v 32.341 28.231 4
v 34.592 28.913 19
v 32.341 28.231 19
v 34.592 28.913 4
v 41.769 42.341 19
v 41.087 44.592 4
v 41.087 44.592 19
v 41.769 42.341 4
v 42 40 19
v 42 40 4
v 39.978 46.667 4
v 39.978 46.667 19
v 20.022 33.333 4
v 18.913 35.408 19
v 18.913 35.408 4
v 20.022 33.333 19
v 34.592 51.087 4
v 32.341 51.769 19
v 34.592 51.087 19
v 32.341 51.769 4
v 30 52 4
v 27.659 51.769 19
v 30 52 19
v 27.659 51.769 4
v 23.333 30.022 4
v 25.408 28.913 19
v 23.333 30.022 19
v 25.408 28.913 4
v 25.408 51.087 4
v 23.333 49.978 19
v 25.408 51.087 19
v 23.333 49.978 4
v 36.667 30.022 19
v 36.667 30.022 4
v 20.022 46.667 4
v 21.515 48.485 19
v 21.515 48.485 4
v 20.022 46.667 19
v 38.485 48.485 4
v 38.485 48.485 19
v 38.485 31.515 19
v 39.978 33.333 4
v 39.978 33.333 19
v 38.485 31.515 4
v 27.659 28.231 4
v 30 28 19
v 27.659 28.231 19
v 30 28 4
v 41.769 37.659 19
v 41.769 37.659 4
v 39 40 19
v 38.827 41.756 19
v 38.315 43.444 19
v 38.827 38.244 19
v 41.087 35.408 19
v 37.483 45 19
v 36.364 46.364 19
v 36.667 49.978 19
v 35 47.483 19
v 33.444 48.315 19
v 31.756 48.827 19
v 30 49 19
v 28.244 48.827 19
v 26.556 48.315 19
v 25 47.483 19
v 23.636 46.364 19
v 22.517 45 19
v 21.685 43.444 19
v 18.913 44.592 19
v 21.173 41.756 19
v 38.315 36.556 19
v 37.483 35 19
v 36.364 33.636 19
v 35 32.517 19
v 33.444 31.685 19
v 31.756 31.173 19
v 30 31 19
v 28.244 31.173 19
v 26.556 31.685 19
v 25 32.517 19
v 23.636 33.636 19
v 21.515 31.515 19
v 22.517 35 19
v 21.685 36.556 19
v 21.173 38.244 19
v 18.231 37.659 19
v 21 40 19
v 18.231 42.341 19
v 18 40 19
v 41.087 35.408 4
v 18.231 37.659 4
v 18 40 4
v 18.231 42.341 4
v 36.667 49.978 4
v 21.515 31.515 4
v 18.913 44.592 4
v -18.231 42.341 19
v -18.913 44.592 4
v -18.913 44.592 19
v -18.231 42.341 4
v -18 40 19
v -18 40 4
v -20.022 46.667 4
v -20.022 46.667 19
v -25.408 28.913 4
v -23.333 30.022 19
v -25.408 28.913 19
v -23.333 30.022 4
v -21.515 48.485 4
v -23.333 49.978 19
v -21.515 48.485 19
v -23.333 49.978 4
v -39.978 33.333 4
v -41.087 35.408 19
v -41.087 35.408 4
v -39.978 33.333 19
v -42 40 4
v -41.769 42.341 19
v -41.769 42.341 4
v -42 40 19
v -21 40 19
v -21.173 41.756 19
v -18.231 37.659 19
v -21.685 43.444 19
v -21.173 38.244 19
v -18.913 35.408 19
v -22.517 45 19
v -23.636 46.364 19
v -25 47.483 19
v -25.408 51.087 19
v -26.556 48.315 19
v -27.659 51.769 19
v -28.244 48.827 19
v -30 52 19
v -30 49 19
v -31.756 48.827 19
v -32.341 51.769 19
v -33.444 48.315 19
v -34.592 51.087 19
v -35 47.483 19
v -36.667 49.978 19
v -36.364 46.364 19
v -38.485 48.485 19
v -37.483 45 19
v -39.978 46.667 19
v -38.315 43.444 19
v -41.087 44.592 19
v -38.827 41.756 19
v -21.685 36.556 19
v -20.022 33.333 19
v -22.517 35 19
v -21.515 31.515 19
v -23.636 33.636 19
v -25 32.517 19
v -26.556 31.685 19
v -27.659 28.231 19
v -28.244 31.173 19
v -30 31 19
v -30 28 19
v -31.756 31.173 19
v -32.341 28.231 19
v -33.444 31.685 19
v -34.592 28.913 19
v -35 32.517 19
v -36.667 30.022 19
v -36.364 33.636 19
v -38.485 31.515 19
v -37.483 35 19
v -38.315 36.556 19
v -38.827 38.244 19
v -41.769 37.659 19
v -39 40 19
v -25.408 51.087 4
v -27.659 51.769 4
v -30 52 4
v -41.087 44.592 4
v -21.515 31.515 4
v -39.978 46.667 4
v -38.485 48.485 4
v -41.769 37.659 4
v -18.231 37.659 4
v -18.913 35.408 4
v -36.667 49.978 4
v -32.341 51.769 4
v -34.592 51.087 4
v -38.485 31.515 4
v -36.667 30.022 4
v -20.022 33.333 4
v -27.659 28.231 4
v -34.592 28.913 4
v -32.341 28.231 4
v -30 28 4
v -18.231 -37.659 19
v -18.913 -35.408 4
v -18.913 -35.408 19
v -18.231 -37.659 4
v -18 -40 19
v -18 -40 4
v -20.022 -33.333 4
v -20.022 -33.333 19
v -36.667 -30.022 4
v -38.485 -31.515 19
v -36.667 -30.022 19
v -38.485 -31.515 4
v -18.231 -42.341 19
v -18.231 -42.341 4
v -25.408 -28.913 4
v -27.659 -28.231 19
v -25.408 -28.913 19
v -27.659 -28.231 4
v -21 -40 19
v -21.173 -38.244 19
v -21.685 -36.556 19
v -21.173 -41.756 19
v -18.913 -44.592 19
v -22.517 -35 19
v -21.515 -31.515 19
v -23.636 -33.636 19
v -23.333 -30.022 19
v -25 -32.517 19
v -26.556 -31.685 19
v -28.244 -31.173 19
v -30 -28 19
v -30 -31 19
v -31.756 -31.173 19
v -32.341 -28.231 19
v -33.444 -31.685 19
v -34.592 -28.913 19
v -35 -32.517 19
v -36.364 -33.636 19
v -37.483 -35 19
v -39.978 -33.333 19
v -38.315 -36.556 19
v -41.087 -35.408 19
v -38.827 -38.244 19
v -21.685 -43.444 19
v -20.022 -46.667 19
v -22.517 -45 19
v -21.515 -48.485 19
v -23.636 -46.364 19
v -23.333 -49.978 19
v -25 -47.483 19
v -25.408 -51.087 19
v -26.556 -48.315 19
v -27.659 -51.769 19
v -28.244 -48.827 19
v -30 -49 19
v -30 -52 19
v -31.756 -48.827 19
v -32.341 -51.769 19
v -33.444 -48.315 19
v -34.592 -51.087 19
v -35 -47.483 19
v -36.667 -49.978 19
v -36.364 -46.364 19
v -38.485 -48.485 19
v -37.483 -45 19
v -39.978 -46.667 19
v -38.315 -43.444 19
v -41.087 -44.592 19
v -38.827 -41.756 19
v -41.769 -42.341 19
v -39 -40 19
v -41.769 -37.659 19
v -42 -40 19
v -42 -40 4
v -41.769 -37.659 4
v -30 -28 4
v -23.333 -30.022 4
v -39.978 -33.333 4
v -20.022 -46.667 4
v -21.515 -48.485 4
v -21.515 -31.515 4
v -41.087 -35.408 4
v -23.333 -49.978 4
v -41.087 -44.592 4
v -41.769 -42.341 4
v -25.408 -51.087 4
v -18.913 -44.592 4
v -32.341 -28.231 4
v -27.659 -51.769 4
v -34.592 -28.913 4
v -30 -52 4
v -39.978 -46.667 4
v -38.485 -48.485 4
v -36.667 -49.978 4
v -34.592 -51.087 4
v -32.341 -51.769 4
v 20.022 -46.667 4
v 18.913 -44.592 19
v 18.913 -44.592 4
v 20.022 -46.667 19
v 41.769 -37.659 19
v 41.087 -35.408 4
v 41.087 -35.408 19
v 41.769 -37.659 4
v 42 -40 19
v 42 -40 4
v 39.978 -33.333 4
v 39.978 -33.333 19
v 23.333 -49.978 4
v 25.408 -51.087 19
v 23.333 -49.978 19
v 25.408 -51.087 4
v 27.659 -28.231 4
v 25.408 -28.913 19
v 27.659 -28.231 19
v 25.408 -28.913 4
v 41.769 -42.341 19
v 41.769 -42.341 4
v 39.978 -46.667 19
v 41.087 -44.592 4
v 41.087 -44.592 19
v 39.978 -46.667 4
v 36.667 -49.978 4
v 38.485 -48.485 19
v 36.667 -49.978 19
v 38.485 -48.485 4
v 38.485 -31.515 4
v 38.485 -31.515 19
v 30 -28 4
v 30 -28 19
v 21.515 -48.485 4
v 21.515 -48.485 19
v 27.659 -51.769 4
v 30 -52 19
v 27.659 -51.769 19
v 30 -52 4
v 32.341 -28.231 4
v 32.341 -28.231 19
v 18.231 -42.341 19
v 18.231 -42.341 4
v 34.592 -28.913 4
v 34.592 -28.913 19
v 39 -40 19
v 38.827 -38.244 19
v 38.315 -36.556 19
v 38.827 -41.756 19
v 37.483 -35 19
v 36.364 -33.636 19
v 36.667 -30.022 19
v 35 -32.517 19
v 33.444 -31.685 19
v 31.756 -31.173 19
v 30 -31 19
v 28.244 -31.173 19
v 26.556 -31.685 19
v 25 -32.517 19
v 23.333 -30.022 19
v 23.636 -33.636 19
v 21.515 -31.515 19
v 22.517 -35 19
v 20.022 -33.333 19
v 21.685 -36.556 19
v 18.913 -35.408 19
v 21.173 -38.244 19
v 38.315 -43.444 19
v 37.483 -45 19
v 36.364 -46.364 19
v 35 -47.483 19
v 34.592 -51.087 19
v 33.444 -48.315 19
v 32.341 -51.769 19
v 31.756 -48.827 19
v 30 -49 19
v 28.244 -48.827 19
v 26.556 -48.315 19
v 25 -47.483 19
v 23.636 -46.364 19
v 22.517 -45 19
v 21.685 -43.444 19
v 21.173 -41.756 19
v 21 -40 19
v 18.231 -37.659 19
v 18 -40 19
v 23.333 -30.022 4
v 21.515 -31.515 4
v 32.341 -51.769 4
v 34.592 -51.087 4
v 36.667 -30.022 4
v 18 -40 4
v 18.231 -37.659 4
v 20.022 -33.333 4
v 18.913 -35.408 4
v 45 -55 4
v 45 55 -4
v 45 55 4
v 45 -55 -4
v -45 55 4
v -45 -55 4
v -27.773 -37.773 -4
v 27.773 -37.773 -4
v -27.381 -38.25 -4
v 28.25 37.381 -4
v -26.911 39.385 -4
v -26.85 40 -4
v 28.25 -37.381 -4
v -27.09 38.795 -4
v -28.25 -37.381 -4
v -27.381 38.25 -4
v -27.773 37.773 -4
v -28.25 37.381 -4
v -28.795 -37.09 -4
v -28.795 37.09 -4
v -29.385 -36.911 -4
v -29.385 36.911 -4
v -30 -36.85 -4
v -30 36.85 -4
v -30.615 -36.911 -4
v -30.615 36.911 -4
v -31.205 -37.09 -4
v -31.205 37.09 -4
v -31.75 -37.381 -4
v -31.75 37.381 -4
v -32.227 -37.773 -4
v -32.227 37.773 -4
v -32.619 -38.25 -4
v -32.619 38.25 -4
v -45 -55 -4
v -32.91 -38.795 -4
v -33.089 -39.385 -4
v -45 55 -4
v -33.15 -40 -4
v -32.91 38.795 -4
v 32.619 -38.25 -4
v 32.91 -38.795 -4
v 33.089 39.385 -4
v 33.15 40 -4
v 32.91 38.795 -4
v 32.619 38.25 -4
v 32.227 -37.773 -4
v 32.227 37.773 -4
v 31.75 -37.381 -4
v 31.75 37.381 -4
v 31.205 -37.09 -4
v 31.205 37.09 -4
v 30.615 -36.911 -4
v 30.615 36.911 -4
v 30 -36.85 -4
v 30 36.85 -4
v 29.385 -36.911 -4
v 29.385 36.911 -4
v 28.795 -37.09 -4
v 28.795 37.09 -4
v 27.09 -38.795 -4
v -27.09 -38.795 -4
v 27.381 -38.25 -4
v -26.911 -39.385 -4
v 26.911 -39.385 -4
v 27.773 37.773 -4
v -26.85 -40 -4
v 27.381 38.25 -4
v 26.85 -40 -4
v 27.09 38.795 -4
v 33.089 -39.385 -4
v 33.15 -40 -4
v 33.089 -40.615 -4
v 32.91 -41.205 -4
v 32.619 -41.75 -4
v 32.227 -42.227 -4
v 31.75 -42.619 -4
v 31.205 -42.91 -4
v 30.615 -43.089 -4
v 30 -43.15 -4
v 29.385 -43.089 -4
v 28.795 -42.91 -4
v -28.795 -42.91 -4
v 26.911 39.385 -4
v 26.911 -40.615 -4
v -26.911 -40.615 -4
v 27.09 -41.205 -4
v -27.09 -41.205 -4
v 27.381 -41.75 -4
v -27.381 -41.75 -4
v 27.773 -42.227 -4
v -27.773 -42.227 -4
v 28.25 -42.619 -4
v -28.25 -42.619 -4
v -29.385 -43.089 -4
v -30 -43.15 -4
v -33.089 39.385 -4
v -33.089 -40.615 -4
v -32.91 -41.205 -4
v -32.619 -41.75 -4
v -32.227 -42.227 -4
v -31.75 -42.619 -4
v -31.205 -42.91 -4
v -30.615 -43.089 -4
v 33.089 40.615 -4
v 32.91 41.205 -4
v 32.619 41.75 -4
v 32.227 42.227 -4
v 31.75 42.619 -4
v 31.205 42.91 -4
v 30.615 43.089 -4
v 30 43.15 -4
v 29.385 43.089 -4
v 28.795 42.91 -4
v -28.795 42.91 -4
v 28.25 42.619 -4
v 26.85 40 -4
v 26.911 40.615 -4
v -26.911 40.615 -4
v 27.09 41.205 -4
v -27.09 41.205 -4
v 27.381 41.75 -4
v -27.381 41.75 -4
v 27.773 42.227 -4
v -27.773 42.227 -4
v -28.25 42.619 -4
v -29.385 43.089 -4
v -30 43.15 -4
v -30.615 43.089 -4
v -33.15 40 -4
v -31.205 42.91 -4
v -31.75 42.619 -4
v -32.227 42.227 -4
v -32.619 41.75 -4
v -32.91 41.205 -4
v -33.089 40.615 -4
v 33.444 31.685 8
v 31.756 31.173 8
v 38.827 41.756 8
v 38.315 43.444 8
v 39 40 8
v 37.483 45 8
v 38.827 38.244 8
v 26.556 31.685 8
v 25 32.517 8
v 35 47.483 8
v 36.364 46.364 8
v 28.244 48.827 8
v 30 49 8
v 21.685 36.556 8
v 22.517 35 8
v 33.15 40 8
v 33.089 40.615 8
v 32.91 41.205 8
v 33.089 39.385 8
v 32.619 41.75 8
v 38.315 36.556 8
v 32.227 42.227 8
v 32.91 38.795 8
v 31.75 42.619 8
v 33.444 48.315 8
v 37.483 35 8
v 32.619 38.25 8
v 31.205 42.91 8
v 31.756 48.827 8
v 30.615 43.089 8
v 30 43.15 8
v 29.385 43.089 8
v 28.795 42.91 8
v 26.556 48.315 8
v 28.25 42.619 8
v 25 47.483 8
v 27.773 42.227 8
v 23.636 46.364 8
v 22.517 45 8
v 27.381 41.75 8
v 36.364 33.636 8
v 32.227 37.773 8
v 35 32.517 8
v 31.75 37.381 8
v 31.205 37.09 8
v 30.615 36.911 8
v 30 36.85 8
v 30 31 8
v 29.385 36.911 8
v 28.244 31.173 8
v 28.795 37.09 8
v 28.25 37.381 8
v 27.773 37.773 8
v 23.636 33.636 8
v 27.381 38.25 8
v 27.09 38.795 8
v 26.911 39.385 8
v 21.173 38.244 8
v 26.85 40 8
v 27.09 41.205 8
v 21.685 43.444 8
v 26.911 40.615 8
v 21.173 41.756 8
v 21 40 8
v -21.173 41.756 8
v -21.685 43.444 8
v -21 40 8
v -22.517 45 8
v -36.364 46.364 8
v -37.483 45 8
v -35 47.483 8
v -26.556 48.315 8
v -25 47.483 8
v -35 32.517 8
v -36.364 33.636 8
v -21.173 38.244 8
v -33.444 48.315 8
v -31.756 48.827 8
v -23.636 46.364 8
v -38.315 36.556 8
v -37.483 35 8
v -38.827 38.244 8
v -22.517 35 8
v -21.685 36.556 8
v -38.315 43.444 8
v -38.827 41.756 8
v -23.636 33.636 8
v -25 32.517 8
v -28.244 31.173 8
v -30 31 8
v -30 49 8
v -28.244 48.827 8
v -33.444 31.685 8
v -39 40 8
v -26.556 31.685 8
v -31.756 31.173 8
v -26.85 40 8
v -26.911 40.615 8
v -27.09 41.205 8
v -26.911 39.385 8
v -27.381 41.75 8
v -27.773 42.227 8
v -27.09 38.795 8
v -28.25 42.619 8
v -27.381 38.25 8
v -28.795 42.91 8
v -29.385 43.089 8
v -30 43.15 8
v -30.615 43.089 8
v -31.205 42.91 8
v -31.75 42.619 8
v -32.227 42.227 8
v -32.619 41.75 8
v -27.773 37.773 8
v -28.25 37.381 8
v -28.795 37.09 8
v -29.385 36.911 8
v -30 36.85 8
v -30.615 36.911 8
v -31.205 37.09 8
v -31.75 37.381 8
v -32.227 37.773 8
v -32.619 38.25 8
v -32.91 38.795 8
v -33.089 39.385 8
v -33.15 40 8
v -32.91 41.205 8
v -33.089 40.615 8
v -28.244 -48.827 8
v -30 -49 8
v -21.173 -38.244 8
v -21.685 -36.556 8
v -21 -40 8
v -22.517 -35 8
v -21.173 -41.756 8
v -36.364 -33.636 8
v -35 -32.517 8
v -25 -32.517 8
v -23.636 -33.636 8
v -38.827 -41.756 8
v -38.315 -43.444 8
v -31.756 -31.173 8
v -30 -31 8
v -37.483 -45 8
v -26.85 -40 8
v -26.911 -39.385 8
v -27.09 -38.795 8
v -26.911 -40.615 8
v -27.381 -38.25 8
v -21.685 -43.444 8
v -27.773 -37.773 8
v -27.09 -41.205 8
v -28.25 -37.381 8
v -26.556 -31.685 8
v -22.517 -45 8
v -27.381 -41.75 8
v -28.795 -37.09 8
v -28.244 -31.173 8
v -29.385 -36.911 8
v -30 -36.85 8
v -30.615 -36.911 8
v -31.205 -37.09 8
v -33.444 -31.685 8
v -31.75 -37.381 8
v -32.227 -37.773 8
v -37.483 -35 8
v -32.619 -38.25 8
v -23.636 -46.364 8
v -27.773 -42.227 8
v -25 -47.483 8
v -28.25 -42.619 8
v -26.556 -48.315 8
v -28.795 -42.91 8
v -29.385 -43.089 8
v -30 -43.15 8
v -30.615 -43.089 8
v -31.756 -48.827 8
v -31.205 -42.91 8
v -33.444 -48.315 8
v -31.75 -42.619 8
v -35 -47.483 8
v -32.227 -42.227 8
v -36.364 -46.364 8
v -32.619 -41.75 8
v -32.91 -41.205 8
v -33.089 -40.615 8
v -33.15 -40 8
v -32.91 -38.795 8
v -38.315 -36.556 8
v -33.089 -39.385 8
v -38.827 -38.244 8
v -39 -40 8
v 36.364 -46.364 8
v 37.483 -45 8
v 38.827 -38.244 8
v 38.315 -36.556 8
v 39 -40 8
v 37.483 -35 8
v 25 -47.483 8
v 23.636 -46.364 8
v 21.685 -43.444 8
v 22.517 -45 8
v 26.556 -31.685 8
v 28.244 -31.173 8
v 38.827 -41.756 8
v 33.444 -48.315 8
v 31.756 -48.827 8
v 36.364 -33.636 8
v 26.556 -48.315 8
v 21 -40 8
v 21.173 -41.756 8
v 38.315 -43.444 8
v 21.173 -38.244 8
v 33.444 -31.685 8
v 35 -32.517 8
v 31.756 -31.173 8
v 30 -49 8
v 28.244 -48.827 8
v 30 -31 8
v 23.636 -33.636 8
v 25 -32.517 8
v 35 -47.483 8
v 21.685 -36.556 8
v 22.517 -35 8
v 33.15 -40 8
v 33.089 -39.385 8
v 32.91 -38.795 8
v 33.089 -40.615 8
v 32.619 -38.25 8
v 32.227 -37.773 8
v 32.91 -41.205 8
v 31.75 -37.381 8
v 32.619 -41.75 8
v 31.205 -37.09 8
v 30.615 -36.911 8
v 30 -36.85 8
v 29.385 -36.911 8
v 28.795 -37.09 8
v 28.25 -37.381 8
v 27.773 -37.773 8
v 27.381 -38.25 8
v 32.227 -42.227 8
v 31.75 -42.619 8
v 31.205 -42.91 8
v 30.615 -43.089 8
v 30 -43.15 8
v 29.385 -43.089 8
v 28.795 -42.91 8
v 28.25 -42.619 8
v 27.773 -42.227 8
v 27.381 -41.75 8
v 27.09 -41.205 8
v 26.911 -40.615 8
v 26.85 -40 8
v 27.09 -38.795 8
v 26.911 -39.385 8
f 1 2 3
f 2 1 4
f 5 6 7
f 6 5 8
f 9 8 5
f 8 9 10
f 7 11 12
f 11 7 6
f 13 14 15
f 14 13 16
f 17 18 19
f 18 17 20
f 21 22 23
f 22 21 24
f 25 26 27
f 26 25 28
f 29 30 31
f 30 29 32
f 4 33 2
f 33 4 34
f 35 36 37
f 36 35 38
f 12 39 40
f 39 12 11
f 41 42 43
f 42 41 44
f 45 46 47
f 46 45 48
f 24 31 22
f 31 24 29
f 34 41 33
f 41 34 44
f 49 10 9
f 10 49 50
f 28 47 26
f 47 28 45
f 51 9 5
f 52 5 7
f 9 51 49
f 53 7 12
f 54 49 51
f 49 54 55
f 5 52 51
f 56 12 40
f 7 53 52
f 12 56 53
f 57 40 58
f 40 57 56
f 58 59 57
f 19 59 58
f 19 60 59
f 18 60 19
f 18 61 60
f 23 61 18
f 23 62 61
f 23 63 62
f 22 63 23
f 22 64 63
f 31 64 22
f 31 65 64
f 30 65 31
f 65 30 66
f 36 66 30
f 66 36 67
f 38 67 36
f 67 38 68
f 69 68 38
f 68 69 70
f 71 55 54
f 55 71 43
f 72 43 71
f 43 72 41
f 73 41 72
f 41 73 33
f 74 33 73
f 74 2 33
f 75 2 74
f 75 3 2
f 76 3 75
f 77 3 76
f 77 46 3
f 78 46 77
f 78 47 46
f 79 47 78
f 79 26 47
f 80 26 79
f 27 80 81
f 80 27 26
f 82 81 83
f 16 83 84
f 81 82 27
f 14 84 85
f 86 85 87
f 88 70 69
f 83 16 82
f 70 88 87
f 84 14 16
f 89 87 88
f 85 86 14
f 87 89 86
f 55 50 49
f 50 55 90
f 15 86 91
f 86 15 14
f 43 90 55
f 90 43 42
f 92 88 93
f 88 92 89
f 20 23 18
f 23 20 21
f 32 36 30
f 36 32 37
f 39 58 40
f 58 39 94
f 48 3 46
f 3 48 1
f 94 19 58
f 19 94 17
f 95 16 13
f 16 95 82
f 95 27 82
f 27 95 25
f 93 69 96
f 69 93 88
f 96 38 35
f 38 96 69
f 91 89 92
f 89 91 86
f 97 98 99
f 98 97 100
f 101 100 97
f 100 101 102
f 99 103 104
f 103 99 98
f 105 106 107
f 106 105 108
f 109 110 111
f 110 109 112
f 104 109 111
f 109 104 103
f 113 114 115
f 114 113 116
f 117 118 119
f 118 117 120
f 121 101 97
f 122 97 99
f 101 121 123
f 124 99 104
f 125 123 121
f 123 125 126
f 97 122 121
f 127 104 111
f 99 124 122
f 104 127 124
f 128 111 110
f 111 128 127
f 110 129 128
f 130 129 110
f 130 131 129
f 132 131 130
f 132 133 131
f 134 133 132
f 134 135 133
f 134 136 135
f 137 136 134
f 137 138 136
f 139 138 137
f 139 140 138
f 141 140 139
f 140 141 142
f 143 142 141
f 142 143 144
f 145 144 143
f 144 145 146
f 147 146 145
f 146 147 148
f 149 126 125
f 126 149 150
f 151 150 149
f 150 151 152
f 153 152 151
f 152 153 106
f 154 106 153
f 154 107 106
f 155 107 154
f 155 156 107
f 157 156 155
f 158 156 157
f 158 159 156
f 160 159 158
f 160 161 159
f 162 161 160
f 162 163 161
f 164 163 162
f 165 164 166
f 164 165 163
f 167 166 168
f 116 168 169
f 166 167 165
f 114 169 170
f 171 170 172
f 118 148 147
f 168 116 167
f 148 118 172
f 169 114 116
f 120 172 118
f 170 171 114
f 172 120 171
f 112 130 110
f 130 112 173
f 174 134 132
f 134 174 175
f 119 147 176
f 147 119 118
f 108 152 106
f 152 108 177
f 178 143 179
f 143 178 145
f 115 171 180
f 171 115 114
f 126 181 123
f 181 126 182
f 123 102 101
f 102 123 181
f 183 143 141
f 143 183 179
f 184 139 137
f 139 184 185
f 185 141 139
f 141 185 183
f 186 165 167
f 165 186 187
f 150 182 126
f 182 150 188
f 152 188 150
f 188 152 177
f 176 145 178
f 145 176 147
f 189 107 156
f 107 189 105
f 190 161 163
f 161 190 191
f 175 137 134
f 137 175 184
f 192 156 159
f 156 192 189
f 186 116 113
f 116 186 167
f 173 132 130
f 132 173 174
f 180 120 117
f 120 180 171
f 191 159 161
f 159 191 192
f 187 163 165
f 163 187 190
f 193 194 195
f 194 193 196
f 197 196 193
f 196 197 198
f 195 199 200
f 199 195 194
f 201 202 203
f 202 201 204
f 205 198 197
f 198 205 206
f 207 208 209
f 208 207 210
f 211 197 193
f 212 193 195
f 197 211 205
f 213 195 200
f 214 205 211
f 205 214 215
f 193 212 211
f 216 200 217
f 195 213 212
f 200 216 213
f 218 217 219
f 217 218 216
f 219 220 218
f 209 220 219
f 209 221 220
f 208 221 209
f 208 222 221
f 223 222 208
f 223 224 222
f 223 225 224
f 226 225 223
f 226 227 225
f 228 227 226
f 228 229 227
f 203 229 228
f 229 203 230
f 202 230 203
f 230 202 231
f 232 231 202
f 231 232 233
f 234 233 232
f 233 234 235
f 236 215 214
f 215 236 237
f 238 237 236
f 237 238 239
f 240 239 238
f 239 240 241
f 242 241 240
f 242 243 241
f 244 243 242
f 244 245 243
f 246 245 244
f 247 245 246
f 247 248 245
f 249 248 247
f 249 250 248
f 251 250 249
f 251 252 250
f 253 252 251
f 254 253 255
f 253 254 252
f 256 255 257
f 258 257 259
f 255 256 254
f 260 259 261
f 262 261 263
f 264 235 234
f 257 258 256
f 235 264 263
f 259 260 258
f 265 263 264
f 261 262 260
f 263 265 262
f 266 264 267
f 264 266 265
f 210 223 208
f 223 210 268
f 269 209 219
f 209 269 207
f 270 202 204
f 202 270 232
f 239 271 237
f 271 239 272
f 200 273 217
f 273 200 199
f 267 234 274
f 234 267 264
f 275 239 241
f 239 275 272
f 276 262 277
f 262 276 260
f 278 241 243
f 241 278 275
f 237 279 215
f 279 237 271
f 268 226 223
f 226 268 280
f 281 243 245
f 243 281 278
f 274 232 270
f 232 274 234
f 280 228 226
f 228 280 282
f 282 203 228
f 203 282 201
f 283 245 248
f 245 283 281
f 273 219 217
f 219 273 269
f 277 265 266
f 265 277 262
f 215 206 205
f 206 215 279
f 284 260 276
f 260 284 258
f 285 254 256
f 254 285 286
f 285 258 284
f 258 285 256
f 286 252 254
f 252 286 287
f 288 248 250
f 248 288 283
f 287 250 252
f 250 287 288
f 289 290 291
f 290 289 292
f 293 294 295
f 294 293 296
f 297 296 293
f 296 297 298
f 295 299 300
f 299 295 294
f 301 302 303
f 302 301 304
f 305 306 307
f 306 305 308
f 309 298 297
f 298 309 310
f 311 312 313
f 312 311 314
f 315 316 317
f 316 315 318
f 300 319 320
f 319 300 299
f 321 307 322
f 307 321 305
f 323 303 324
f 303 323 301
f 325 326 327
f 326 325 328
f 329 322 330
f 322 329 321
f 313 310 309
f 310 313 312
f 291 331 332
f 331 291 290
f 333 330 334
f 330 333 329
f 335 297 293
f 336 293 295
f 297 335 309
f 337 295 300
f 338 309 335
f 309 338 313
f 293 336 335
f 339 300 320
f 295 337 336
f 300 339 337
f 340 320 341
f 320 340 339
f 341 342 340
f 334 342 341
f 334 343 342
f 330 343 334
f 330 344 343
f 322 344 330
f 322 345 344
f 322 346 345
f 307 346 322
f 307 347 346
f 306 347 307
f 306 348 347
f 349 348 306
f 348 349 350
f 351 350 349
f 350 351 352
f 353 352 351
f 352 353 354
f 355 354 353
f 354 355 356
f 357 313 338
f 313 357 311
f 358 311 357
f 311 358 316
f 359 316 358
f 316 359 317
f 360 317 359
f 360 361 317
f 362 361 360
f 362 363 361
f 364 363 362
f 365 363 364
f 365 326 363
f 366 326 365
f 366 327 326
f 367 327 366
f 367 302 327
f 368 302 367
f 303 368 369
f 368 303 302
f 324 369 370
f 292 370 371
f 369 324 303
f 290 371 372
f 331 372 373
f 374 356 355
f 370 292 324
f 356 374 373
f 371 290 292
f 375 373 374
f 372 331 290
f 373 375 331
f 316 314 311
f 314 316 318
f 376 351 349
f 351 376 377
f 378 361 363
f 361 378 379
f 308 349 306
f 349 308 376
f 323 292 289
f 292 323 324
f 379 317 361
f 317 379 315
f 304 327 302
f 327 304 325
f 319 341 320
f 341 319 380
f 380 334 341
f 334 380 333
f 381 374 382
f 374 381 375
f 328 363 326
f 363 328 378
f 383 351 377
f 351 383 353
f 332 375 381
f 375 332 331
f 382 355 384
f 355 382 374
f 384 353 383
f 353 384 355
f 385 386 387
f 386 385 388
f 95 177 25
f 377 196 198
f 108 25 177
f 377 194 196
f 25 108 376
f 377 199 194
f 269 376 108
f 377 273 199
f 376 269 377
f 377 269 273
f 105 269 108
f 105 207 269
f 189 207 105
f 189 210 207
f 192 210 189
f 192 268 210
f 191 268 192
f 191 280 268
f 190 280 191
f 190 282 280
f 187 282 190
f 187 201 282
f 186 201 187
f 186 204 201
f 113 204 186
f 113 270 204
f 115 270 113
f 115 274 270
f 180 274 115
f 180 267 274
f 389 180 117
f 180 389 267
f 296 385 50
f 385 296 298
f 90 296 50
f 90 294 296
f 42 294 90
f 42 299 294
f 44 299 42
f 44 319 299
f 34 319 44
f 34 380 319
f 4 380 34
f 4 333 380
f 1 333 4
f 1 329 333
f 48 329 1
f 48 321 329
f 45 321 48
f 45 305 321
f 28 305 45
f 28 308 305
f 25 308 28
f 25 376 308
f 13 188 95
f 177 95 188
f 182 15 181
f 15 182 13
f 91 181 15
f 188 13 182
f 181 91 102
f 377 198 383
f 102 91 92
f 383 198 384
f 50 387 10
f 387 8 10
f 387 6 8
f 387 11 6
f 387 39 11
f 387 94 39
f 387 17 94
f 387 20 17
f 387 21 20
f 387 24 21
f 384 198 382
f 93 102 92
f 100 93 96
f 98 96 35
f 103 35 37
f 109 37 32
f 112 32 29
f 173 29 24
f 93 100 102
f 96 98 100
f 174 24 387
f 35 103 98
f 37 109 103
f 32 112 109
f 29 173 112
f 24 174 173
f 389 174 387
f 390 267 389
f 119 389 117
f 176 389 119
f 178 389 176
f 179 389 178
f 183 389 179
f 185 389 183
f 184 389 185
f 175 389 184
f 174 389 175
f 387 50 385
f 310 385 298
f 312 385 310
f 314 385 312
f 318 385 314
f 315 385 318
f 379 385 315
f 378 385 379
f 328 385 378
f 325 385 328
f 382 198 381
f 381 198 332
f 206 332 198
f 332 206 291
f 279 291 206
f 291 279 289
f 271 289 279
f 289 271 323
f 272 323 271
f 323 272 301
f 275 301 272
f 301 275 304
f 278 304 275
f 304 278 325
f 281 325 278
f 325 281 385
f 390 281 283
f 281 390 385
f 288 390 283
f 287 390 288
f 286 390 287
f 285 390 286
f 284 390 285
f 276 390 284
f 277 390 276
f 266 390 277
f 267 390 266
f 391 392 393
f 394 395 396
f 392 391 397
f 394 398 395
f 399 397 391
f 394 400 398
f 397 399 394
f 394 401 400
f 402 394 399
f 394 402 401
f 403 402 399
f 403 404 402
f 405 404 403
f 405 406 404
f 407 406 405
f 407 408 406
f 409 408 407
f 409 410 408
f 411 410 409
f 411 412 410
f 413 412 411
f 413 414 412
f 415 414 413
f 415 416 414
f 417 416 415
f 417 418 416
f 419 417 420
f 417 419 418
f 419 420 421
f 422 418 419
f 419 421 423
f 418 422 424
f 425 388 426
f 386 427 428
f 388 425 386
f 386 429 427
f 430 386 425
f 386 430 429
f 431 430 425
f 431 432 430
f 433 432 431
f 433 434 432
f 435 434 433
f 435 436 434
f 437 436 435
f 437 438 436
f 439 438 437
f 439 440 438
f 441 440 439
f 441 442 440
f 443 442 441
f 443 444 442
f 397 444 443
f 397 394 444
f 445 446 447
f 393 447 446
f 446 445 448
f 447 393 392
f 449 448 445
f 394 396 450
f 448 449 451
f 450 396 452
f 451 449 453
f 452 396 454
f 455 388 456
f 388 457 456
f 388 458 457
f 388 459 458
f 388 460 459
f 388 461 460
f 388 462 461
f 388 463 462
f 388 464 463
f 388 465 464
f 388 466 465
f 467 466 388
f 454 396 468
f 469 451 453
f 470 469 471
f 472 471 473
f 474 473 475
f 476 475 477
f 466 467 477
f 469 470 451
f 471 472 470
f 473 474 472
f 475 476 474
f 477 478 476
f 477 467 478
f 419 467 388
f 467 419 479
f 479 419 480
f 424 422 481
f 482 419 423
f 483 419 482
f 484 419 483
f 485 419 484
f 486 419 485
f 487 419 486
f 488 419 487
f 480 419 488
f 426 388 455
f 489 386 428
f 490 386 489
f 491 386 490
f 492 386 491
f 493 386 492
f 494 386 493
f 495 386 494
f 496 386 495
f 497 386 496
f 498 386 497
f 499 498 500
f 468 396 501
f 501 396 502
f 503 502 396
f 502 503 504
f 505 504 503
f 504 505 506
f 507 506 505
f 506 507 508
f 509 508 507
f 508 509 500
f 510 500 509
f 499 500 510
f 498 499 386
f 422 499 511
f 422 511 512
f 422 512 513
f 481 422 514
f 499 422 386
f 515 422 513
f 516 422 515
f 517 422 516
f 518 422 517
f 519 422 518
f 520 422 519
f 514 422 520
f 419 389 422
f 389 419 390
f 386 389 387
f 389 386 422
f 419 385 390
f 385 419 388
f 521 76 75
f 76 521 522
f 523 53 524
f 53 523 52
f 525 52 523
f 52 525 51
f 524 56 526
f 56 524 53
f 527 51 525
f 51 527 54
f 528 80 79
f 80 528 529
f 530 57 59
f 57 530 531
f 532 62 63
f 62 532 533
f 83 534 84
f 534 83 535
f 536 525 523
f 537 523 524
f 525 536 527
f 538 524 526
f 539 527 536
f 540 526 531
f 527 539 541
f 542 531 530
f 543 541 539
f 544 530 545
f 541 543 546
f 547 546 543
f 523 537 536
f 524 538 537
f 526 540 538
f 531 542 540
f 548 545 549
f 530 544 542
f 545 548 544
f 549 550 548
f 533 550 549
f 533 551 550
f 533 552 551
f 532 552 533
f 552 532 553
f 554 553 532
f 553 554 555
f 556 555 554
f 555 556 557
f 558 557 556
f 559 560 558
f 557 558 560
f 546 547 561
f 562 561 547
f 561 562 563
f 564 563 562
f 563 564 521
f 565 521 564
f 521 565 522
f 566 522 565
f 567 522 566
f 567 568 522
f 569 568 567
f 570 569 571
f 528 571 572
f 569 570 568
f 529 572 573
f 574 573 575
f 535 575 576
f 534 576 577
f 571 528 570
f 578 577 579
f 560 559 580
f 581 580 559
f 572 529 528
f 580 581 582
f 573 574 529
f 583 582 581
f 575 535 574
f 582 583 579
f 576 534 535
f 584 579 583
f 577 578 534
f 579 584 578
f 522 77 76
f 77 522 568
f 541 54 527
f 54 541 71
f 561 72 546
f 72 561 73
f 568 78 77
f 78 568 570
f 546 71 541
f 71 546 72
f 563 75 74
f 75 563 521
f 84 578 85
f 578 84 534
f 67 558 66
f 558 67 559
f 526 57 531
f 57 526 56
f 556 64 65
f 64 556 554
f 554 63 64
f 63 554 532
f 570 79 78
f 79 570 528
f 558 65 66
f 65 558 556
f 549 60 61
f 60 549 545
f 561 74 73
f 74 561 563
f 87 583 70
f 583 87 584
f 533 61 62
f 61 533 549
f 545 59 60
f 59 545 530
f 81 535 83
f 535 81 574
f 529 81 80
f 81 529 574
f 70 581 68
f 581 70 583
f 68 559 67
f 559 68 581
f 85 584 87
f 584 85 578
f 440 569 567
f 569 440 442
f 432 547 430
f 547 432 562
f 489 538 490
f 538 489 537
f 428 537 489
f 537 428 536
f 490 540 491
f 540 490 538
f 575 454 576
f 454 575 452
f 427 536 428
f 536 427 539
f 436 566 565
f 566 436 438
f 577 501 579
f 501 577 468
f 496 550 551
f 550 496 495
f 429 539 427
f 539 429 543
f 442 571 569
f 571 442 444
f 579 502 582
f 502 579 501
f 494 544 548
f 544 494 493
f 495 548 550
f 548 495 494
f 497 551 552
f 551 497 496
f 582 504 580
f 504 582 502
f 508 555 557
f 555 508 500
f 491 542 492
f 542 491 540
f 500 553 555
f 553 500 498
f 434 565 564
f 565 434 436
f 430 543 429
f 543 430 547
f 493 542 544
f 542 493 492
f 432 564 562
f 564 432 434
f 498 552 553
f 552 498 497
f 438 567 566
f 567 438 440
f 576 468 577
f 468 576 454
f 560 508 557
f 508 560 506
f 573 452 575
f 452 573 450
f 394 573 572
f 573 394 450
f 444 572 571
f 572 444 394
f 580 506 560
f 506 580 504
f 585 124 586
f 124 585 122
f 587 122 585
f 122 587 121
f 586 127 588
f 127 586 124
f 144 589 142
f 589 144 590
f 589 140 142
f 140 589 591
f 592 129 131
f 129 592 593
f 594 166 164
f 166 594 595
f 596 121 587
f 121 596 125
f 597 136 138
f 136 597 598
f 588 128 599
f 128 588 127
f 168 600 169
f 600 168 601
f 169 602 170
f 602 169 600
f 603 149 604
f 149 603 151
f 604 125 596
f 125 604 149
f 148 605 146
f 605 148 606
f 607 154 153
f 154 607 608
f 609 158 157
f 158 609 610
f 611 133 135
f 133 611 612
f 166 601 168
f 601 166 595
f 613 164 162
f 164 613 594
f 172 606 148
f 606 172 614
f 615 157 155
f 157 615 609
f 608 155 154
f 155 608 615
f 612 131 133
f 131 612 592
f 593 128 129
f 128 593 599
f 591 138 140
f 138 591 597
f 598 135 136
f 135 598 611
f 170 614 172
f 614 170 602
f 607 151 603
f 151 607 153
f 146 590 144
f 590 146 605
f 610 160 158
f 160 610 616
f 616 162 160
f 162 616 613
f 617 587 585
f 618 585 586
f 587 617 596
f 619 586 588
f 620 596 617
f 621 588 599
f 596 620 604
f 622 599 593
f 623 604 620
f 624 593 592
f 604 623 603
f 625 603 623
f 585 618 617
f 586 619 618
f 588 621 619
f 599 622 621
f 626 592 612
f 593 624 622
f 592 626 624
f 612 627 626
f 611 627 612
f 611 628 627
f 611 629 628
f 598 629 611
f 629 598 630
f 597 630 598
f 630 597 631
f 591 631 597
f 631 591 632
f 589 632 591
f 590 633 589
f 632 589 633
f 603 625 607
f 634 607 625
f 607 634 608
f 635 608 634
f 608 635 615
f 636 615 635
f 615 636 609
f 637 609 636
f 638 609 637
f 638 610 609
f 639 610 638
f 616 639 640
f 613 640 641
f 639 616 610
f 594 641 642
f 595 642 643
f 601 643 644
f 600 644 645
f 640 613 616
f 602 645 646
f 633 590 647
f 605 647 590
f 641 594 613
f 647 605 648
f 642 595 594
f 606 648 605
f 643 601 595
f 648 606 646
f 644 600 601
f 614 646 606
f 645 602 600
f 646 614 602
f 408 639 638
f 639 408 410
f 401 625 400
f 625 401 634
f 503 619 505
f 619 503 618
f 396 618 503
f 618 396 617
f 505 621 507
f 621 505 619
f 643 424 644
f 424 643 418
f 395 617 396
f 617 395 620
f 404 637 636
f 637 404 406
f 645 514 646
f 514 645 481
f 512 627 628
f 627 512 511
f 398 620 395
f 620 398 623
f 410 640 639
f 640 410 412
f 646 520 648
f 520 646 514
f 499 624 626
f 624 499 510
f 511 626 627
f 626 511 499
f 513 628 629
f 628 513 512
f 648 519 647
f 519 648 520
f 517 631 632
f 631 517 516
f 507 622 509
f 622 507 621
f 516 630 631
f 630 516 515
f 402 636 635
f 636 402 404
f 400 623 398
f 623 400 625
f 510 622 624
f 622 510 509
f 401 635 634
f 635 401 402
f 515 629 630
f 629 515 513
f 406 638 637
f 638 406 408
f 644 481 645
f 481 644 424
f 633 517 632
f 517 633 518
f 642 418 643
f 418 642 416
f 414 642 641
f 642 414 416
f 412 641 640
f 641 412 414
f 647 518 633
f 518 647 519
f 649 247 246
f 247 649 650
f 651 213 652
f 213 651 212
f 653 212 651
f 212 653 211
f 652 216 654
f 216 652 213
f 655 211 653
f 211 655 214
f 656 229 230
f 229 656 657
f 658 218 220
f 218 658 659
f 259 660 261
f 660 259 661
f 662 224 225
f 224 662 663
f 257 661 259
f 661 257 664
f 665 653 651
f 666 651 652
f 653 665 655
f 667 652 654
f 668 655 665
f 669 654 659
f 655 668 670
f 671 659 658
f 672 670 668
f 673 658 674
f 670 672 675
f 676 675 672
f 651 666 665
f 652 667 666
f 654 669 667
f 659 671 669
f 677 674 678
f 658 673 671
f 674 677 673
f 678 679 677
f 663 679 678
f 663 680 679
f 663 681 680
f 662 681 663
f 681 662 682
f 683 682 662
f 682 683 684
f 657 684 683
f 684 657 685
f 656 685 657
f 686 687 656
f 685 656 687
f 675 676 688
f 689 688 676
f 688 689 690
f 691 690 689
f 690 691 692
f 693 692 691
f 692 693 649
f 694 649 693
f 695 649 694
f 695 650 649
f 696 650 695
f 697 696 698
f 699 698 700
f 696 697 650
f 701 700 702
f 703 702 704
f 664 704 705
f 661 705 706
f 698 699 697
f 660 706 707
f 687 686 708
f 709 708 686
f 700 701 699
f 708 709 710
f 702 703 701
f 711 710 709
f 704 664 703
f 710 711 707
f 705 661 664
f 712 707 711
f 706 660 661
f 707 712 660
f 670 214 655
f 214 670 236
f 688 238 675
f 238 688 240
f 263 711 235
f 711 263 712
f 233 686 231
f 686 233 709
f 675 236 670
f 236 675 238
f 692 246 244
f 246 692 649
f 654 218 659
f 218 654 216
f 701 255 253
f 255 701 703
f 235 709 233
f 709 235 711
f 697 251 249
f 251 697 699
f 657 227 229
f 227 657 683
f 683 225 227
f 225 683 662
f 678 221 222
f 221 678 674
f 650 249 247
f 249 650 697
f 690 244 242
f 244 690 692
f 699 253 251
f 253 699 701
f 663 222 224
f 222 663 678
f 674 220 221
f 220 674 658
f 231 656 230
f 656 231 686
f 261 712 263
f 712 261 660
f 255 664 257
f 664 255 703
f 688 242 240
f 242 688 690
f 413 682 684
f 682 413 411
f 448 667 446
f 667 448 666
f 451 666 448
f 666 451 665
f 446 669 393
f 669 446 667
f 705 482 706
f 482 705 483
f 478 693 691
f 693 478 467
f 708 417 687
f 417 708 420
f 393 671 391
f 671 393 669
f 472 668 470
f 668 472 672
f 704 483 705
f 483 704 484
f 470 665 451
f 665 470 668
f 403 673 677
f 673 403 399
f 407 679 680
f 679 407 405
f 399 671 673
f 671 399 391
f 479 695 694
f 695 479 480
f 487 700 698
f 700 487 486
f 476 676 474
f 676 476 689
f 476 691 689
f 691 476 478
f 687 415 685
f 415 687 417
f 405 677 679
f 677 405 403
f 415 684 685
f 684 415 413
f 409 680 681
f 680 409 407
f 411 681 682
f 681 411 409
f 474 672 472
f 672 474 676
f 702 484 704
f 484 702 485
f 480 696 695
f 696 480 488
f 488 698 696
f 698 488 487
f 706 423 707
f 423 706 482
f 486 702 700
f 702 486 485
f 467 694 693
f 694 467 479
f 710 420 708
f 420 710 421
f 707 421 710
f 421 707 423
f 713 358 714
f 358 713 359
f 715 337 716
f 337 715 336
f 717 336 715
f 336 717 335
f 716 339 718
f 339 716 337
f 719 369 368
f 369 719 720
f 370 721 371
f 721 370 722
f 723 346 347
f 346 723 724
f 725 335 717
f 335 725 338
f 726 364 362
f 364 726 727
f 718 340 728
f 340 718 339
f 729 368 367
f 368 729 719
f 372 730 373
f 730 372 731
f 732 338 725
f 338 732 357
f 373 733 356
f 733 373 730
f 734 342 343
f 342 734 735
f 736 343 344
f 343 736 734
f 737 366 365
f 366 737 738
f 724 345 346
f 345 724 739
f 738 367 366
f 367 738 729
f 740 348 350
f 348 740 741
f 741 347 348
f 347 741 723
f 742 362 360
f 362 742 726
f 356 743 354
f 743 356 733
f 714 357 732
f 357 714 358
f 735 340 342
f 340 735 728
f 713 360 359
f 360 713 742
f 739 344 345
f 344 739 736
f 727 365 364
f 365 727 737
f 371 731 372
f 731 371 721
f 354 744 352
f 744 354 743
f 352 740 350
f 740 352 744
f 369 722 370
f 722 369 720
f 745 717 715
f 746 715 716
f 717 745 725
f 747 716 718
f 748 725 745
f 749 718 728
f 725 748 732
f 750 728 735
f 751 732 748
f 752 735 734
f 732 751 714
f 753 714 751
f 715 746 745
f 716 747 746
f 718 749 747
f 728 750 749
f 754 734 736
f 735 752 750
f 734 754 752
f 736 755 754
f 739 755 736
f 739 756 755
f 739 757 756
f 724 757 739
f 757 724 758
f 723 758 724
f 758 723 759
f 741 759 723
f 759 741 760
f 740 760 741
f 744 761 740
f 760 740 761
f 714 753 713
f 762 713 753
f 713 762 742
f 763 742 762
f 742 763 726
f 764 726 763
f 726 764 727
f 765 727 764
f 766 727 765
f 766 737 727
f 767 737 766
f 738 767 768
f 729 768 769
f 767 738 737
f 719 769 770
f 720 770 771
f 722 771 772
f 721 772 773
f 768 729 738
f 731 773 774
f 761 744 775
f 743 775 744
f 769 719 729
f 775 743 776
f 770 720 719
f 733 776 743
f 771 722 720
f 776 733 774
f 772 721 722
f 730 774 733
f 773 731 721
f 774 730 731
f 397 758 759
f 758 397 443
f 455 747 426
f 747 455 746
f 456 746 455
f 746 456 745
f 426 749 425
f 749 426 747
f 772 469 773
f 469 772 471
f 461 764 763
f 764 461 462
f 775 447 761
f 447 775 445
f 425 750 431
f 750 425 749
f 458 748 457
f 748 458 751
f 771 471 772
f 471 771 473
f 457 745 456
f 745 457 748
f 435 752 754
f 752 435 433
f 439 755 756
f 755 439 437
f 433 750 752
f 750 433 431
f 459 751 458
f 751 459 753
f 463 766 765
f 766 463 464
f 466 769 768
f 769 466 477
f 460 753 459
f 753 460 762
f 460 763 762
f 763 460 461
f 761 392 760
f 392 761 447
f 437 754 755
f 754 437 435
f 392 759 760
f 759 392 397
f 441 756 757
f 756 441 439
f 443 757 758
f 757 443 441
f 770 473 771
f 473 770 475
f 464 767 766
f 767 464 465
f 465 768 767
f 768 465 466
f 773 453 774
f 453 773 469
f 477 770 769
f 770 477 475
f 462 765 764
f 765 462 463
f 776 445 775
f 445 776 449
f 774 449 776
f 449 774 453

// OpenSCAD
$fn = 32;

// ----------------------------------------------------------------------
// Socket pad plate
// bosses with counterbored sockets for the screws
// ----------------------------------------------------------------------

// --- parameters (mm) ---
base_t = 8;            // base plate thickness
boss_h = 15;           // boss height above the base plate
boss_d = 24;           // boss diameter
socket_d = 18;         // socket diameter
socket_depth = 11;     // socket depth from the boss face
bolt_d = 6.3;          // screw clearance hole through the socket floor
plate = [90, 110, 8];  // overall size (x, y, z)
edge = 15;             // boss centre offset from the plate edge
pads = 4;              // boss count, one per corner

// --- derived feature positions (mm) ---
height = base_t + boss_h;        // = 23   overall height of the part
corner_x = plate[0] / 2 - edge;  // = 30   boss centre X
corner_y = plate[1] / 2 - edge;  // = 40   boss centre Y
feature_centers = [
  [corner_x, corner_y],
  [-corner_x, corner_y],
  [-corner_x, -corner_y],
  [corner_x, -corner_y]
];   // boss centres: sockets, holes and the pads themselves are placed from here

// base plate, bosses on feature_centers, socket + through hole in each
difference() {
  union() {
    cube(plate, center = true);
    for (centre = feature_centers)
      translate([centre[0], centre[1], plate[2] / 2 - 1])
        cylinder(d = boss_d, h = boss_h + 1);
  }
  for (centre = feature_centers) {
    translate([centre[0], centre[1], plate[2] / 2 + boss_h - socket_depth])
      cylinder(d = socket_d, h = socket_depth + 1);
    translate([centre[0], centre[1], -height])
      cylinder(d = bolt_d, h = 2 * height + 2);  // through the socket floor
  }
}
